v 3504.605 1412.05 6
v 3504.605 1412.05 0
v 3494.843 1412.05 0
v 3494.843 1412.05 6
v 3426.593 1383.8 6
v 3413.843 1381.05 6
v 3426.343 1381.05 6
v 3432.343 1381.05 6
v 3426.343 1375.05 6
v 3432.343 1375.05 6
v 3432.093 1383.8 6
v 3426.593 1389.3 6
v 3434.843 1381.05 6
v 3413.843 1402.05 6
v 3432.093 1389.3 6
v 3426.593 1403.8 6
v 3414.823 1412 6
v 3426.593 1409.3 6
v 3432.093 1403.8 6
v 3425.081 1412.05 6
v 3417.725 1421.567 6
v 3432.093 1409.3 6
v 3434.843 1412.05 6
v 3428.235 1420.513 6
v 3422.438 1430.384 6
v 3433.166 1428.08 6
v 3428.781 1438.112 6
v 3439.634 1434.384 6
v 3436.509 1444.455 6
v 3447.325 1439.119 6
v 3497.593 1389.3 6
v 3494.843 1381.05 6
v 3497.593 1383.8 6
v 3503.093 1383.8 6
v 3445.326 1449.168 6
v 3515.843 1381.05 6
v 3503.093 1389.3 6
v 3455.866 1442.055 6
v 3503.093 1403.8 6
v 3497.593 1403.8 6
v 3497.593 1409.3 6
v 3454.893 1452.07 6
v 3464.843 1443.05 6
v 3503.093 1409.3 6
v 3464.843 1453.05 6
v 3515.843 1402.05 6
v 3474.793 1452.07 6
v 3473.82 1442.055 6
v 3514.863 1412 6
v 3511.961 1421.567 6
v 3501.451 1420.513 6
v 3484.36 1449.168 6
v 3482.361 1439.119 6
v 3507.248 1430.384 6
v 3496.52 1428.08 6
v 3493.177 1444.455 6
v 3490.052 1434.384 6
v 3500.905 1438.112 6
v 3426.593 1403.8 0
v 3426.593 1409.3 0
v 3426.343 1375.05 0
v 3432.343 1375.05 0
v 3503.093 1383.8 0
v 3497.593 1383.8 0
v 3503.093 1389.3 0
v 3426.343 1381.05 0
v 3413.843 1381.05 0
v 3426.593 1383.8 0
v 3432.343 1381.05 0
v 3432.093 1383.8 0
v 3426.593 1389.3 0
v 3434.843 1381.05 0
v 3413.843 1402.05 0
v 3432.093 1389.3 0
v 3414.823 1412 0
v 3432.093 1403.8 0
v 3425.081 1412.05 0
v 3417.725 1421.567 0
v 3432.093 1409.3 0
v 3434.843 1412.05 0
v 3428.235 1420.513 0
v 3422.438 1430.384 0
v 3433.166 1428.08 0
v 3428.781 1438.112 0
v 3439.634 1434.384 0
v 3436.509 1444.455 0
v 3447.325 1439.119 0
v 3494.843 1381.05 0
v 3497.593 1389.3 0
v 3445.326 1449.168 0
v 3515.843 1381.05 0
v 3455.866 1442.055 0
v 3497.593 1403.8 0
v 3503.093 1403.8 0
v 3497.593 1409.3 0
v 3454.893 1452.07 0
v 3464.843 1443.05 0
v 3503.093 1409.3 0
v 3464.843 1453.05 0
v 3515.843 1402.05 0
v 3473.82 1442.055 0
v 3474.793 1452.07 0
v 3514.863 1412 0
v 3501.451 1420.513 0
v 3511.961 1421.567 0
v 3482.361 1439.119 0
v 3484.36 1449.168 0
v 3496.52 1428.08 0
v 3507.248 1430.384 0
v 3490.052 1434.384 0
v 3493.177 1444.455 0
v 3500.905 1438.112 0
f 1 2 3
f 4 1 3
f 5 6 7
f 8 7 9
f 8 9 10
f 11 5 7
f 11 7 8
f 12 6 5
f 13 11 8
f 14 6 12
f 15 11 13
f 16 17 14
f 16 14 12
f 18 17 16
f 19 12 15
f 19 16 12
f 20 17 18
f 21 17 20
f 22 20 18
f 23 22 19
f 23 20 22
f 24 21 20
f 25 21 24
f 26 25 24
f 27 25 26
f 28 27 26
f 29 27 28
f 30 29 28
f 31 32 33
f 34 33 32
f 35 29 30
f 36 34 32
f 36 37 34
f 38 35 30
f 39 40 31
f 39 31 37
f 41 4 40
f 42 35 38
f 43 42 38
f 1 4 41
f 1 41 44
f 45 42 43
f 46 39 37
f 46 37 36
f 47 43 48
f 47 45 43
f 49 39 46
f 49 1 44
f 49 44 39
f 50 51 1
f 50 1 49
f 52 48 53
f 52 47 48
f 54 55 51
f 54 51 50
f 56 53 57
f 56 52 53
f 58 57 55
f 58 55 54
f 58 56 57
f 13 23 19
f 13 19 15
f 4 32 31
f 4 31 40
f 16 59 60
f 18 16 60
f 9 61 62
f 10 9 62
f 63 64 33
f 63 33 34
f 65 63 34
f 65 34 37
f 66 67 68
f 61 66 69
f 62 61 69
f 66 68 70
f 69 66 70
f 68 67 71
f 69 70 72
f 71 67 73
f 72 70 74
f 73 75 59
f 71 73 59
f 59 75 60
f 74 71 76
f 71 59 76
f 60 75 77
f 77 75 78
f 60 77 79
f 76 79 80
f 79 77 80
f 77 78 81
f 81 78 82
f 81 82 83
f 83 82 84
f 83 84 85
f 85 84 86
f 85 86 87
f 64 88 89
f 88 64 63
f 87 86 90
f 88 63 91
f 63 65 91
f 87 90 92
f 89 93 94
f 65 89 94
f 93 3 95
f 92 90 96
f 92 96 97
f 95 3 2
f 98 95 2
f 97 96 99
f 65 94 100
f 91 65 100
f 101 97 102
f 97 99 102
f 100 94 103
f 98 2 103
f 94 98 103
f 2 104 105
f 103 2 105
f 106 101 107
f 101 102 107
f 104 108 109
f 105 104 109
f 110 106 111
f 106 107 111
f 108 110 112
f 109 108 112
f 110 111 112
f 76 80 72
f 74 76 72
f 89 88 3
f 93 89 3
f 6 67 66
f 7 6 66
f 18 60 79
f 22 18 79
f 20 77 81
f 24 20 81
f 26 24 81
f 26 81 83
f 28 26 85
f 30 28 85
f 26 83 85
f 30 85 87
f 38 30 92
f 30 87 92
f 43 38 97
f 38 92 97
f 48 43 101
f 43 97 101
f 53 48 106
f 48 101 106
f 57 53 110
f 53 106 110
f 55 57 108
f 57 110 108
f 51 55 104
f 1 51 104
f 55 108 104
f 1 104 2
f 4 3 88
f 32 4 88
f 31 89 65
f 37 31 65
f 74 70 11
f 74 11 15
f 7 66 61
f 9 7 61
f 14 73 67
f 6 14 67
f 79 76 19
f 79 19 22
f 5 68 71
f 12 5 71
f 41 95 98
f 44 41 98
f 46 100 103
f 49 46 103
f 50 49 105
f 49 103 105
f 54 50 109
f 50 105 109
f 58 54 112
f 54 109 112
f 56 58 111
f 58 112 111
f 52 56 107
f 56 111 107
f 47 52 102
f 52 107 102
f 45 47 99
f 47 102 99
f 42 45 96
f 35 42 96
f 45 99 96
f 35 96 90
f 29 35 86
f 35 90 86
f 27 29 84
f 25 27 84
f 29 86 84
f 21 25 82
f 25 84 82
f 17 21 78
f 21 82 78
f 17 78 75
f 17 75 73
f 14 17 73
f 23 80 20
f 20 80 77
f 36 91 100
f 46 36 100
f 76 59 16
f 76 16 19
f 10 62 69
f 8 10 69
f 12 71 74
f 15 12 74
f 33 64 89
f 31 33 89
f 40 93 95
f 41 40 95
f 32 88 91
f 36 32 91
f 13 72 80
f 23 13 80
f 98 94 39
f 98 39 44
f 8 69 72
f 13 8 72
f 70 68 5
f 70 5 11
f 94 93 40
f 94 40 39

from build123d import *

# Parameters (mm, degrees)
MODEL_W             = 5.5
MODEL_H             = 5.5
BOSS_EXTRUDE1_DEPTH = 6


with BuildPart() as part:
    # Model → Boss-Extrude1 (new body)
    with BuildSketch(Plane.XY):
        with BuildLine():
            Line((3413.843002063, 1402.049969321), (3413.843002063, 1381.049969321))
            Line((3413.843002063, 1381.049969321), (3426.343002063, 1381.049969321))
            Line((3426.343002063, 1381.049969321), (3426.343002063, 1375.049969321))
            Line((3426.343002063, 1375.049969321), (3432.343002063, 1375.049969321))
            Line((3432.343002063, 1375.049969321), (3432.343002063, 1381.049969321))
            Line((3432.343002063, 1381.049969321), (3434.843002063, 1381.049969321))
            Line((3434.843002063, 1381.049969321), (3434.843002063, 1412.049969321))
            Line((3434.843002063, 1412.049969321), (3425.081211359, 1412.049969321))
            ThreePointArc((3425.081211359, 1412.049969321), (3464.843002063, 1443.049969321), (3504.604792768, 1412.049969321))
            Line((3504.604792768, 1412.049969321), (3494.843002063, 1412.049969321))
            Line((3494.843002063, 1412.049969321), (3494.843002063, 1381.049969321))
            Line((3494.843002063, 1381.049969321), (3505.843002063, 1381.049969321))
            Line((3505.843002063, 1381.049969321), (3515.843002063, 1381.049969321))
            Line((3515.843002063, 1381.049969321), (3515.843002063, 1402.049969321))
            ThreePointArc((3515.843002063, 1402.049969321), (3464.843002063, 1453.049969321), (3413.843002063, 1402.049969321))
        make_face()
        with Locations((3500.343002063, 1386.549969321)):
            Rectangle(MODEL_W, MODEL_H, mode=Mode.SUBTRACT)
        with Locations((3500.343002063, 1406.549969321)):
            Rectangle(MODEL_W, MODEL_H, mode=Mode.SUBTRACT)
        with Locations((3429.343002063, 1386.549969321)):
            Rectangle(MODEL_W, MODEL_H, mode=Mode.SUBTRACT)
        with Locations((3429.343002063, 1406.549969321)):
            Rectangle(MODEL_W, MODEL_H, mode=Mode.SUBTRACT)
    extrude(amount=BOSS_EXTRUDE1_DEPTH)


solid = part.part
